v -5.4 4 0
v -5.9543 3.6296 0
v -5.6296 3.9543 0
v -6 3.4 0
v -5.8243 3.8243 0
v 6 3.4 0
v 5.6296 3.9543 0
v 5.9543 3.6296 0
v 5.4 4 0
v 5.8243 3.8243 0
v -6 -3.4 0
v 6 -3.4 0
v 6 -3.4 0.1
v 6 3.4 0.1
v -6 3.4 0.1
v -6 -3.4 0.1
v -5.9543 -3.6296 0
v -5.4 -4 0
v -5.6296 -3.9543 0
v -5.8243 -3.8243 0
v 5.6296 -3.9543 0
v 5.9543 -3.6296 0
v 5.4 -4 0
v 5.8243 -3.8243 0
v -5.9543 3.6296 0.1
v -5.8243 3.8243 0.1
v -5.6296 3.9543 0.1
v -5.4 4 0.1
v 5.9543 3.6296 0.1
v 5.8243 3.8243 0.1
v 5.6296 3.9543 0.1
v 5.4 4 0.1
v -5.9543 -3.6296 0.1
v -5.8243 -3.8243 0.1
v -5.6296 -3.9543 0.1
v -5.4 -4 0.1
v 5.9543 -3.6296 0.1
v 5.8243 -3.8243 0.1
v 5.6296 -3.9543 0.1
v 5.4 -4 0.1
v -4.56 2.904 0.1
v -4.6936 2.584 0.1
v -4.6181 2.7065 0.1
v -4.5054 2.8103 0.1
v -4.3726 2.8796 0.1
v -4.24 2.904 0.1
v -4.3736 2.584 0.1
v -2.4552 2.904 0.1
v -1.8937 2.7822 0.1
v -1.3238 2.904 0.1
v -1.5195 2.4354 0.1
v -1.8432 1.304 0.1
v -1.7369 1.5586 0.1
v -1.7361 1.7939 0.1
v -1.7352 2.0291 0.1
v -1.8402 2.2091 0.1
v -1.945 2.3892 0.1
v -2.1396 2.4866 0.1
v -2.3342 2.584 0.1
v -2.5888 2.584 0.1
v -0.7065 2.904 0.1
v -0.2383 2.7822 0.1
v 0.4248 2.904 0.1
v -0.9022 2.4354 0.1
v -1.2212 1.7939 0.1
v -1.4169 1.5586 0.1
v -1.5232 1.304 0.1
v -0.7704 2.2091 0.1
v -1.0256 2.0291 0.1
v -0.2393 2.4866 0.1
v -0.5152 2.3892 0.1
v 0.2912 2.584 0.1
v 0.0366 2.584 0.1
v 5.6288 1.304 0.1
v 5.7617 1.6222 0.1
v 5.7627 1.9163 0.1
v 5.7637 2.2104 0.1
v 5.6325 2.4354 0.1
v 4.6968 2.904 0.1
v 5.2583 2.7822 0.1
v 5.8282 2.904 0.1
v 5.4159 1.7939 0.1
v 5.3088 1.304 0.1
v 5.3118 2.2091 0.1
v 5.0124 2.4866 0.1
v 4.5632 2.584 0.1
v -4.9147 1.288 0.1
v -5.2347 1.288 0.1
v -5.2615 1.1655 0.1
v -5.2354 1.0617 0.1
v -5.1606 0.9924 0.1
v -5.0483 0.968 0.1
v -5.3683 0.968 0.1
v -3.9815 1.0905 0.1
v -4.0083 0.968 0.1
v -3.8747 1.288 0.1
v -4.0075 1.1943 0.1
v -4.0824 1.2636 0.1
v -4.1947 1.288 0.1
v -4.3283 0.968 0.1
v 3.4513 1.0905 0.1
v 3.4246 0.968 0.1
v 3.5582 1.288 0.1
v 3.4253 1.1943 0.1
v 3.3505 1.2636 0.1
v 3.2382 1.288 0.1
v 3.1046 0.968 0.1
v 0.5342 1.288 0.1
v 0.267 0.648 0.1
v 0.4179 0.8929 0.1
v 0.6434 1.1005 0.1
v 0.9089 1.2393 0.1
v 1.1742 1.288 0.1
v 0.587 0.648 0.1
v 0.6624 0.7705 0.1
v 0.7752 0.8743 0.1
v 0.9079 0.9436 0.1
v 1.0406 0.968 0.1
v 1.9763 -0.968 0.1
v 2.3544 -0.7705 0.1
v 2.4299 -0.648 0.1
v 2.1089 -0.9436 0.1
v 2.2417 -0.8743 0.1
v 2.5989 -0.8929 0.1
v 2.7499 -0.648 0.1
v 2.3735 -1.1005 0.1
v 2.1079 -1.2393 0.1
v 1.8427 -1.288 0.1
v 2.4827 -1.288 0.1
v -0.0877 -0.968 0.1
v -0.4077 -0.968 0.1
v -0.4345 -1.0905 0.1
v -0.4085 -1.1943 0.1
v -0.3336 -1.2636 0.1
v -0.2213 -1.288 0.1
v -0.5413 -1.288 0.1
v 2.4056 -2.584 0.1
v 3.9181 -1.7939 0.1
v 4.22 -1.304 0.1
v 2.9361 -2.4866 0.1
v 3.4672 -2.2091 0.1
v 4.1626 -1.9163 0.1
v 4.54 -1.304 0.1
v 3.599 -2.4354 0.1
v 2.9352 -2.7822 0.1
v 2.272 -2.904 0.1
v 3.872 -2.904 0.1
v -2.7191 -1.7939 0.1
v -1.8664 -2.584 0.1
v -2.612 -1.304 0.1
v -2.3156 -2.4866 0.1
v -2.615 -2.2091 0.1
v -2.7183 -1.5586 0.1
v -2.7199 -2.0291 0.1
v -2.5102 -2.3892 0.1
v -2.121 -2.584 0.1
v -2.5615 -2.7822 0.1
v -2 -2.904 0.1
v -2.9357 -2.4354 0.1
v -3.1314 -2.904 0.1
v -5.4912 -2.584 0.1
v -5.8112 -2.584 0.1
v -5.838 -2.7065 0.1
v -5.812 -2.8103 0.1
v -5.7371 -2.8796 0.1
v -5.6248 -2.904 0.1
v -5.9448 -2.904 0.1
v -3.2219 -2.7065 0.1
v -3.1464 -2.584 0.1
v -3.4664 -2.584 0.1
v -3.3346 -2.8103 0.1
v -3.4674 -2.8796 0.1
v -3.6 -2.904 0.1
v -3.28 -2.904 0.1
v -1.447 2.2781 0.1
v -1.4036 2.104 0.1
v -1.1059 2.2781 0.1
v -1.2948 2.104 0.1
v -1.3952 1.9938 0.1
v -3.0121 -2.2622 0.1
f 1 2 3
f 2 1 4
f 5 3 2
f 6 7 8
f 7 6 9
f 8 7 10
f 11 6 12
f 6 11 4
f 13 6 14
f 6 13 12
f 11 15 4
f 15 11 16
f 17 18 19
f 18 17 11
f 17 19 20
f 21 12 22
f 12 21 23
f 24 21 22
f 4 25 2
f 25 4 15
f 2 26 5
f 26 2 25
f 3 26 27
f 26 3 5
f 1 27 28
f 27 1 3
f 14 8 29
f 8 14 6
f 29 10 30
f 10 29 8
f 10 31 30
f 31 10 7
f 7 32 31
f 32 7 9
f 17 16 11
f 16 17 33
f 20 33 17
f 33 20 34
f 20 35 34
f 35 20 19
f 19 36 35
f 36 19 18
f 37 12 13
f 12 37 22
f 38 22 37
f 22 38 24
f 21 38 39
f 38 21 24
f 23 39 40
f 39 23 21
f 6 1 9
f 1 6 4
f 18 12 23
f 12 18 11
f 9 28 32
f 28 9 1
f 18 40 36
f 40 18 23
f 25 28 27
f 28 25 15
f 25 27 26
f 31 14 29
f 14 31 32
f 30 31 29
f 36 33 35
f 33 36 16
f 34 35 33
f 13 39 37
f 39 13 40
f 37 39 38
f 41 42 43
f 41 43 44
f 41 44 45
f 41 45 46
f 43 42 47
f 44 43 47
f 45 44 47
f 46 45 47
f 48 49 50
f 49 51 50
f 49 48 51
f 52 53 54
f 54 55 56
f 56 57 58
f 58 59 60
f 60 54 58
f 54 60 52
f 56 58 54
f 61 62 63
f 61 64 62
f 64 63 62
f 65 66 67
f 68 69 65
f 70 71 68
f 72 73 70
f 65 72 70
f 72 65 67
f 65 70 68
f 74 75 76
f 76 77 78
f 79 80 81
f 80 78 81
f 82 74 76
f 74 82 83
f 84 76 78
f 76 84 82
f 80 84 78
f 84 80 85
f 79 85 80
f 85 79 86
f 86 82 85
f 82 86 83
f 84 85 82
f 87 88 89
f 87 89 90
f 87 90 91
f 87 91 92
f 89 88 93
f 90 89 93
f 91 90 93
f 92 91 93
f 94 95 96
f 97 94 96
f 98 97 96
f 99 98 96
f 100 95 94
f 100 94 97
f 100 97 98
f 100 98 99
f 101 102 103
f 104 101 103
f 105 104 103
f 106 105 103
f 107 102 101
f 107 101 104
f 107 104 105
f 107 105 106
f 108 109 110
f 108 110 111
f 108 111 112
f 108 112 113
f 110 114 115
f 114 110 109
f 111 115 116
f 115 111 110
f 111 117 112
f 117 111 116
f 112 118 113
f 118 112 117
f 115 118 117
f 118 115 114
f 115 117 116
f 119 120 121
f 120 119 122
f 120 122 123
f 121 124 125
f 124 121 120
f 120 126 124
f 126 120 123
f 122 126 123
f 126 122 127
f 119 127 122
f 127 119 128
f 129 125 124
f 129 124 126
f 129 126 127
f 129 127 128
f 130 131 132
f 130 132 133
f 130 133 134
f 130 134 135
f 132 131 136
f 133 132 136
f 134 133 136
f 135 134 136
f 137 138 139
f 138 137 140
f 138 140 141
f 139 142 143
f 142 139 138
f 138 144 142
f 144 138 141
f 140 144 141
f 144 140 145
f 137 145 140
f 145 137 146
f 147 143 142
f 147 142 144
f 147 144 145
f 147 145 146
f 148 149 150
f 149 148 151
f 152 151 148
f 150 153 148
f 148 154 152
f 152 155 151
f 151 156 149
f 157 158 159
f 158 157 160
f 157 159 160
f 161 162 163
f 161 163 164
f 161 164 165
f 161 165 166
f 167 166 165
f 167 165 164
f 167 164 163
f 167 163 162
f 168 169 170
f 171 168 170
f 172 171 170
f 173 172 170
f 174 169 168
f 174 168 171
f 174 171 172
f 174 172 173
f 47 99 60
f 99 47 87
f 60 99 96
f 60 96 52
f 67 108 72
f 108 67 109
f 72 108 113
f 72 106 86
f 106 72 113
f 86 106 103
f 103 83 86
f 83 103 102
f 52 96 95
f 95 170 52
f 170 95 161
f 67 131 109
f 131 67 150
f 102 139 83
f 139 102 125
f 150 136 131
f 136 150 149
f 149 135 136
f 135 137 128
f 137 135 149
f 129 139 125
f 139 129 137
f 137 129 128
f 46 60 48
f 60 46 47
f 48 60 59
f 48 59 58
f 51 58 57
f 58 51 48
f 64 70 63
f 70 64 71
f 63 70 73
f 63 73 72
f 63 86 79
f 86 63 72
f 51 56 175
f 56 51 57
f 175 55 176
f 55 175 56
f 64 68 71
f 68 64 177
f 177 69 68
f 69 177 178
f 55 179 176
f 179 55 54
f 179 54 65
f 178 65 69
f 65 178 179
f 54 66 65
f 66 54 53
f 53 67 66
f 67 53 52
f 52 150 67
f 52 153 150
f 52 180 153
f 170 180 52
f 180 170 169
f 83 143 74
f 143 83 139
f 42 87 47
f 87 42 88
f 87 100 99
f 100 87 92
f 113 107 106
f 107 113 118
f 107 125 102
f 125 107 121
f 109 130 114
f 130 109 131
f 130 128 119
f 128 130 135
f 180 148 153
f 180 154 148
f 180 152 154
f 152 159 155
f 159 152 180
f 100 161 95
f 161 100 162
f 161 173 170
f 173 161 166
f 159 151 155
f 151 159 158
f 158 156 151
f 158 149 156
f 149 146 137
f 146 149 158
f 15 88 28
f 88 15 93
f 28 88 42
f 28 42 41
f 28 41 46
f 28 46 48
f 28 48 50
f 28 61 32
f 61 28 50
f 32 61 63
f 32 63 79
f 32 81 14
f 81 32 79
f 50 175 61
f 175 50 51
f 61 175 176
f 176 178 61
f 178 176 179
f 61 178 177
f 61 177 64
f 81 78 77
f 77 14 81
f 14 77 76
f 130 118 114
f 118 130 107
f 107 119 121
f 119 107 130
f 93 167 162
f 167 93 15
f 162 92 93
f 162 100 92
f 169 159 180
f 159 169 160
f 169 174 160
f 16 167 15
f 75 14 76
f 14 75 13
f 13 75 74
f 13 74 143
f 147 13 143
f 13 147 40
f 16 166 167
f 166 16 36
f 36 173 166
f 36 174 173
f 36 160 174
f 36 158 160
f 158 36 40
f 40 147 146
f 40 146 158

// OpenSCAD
// file: ../p/box3u12.scad
use <../lib.scad>
function ldraw_lib__box3u12() = [
// 0 Box with 3 Parallel Faces without Any Edges
// 0 Name: box3u12.dat
// 0 Author: J.C. Tchang [tchang]
// 0 !LDRAW_ORG Primitive UPDATE 2014-02
// 0 !LICENSE Licensed under CC BY 4.0 : see CAreadme.txt
// 
// 0 BFC CERTIFY CCW
  [0,"BFC","CERTIFY"],
  [0,"BFC","CCW"],
// 
// 0 !HISTORY 2014-12-23 [PTadmin] Official Update 2014-02
// 
// 
// 4 16 -1 1 1 1 1 1 1 1 -1 -1 1 -1
  [4,16,-1,1,1,1,1,1,1,1,-1,-1,1,-1],
// 4 16 -1 1 1 -1 0 1 1 0 1 1 1 1
  [4,16,-1,1,1,-1,0,1,1,0,1,1,1,1],
// 4 16 1 1 -1 1 0 -1 -1 0 -1 -1 1 -1
  [4,16,1,1,-1,1,0,-1,-1,0,-1,-1,1,-1],
];
module ldraw_lib__box3u12(step=0, col=false, unit=2/5, alt=false, line=0.2, solid=!$preview)
    makepoly(ldraw_lib__box3u12(), step=step, col=col, unit=unit, alt=alt, line=line, solid=solid);
ldraw_lib__box3u12(line=0.2);
// file: ../p/1-4cyli.scad
use <../lib.scad>
function ldraw_lib__1_4cyli() = [
// 0 Cylinder 0.25
// 0 Name: 1-4cyli.dat
// 0 Author: James Jessiman
// 0 !LDRAW_ORG Primitive UPDATE 2012-01
// 0 !LICENSE Licensed under CC BY 4.0 : see CAreadme.txt
// 
// 0 BFC CERTIFY CCW
  [0,"BFC","CERTIFY"],
  [0,"BFC","CCW"],
// 
// 0 !HISTORY 2002-03-23 [sbliss] Added BFC statement.
// 0 !HISTORY 2002-04-25 [PTadmin] Official Update 2002-02
// 0 !HISTORY 2007-06-22 [PTadmin] Header formatted for Contributor Agreement
// 0 !HISTORY 2008-07-01 [PTadmin] Official Update 2008-01
// 0 !HISTORY 2012-02-16 [Philo] Changed to CCW
// 0 !HISTORY 2012-03-30 [PTadmin] Official Update 2012-01
// 
// 
// 4 16 1 1 0 0.9239 1 0.3827 0.9239 0 0.3827 1 0 0
  [4,16,1,1,0,0.9239,1,0.3827,0.9239,0,0.3827,1,0,0],
// 5 24 1 0 0 1 1 0 0.9239 0 0.3827 1 0 -1
  [5,24,1,0,0,1,1,0,0.9239,0,0.3827,1,0,-1],
// 4 16 0.9239 1 0.3827 0.7071 1 0.7071 0.7071 0 0.7071 0.9239 0 0.3827
  [4,16,0.9239,1,0.3827,0.7071,1,0.7071,0.7071,0,0.7071,0.9239,0,0.3827],
// 5 24 0.9239 0 0.3827 0.9239 1 0.3827 0.7071 0 0.7071 1 0 0
  [5,24,0.9239,0,0.3827,0.9239,1,0.3827,0.7071,0,0.7071,1,0,0],
// 4 16 0.7071 1 0.7071 0.3827 1 0.9239 0.3827 0 0.9239 0.7071 0 0.7071
  [4,16,0.7071,1,0.7071,0.3827,1,0.9239,0.3827,0,0.9239,0.7071,0,0.7071],
// 5 24 0.7071 0 0.7071 0.7071 1 0.7071 0.3827 0 0.9239 0.9239 0 0.3827
  [5,24,0.7071,0,0.7071,0.7071,1,0.7071,0.3827,0,0.9239,0.9239,0,0.3827],
// 4 16 0.3827 1 0.9239 0 1 1 0 0 1 0.3827 0 0.9239
  [4,16,0.3827,1,0.9239,0,1,1,0,0,1,0.3827,0,0.9239],
// 5 24 0.3827 0 0.9239 0.3827 1 0.9239 0 0 1 0.7071 0 0.7071
  [5,24,0.3827,0,0.9239,0.3827,1,0.9239,0,0,1,0.7071,0,0.7071],
// 5 24 0 0 1 0 1 1 0.3827 0 0.9239 -1 0 1
  [5,24,0,0,1,0,1,1,0.3827,0,0.9239,-1,0,1],
];
module ldraw_lib__1_4cyli(step=0, col=false, unit=2/5, alt=false, line=0.2, solid=!$preview)
    makepoly(ldraw_lib__1_4cyli(), step=step, col=col, unit=unit, alt=alt, line=line, solid=solid);
ldraw_lib__1_4cyli(line=0.2);
// file: s/stickerback010x015.scad
use <../../lib.scad>
use <../../p/1-4chrd.scad>
use <../../p/1-4cyli.scad>
use <../../p/box3u12.scad>
function ldraw_lib__s__stickerback010x015() = [
// 0 ~Sticker Back  1.0 x  1.5
// 0 Name: s\stickerback010x015.dat
// 0 Author: Massimo Maso [Sirio]
// 0 !LDRAW_ORG Subpart UPDATE 2025-09
// 0 !LICENSE Licensed under CC BY 4.0 : see CAreadme.txt
// 
// 0 BFC CERTIFY CCW
  [0,"BFC","CERTIFY"],
  [0,"BFC","CCW"],
// 
// 0 !HISTORY 2025-09-29 [OrionP] Official Update 2025-09
// 
// 0 // Primitives
// 1 16 -13.5 0 8.5 -1.5 0 0 0 -1 0 0 0 1.5 1-4chrd.dat
  [1,16,-13.5,0,8.5,-1.5,0,0,0,-1,0,0,0,1.5, ldraw_lib__1_4chrd()],
// 1 16 13.5 0 8.5 1.5 0 0 0 -1 0 0 0 1.5 1-4chrd.dat
  [1,16,13.5,0,8.5,1.5,0,0,0,-1,0,0,0,1.5, ldraw_lib__1_4chrd()],
// 1 16 0 -.25 0 0 0 15 0 .25 0 8.5 0 0 box3u12.dat
  [1,16,0,-.25,0,0,0,15,0,.25,0,8.5,0,0, ldraw_lib__box3u12()],
// 1 16 -13.5 0 -8.5 -1.5 0 0 0 -1 0 0 0 -1.5 1-4chrd.dat
  [1,16,-13.5,0,-8.5,-1.5,0,0,0,-1,0,0,0,-1.5, ldraw_lib__1_4chrd()],
// 1 16 13.5 0 -8.5 1.5 0 0 0 -1 0 0 0 -1.5 1-4chrd.dat
  [1,16,13.5,0,-8.5,1.5,0,0,0,-1,0,0,0,-1.5, ldraw_lib__1_4chrd()],
// 1 16 -13.5 0 8.5 -1.5 0 0 0 -.25 0 0 0 1.5 1-4cyli.dat
  [1,16,-13.5,0,8.5,-1.5,0,0,0,-.25,0,0,0,1.5, ldraw_lib__1_4cyli()],
// 1 16 13.5 0 8.5 1.5 0 0 0 -.25 0 0 0 1.5 1-4cyli.dat
  [1,16,13.5,0,8.5,1.5,0,0,0,-.25,0,0,0,1.5, ldraw_lib__1_4cyli()],
// 1 16 -13.5 0 -8.5 -1.5 0 0 0 -.25 0 0 0 -1.5 1-4cyli.dat
  [1,16,-13.5,0,-8.5,-1.5,0,0,0,-.25,0,0,0,-1.5, ldraw_lib__1_4cyli()],
// 1 16 13.5 0 -8.5 1.5 0 0 0 -.25 0 0 0 -1.5 1-4cyli.dat
  [1,16,13.5,0,-8.5,1.5,0,0,0,-.25,0,0,0,-1.5, ldraw_lib__1_4cyli()],
// 0 // Bottom faces
// 4 16 -15 0 8.5 -13.5 0 10 13.5 0 10 15 0 8.5
  [4,16,-15,0,8.5,-13.5,0,10,13.5,0,10,15,0,8.5],
// 4 16 -15 0 -8.5 15 0 -8.5 13.5 0 -10 -13.5 0 -10
  [4,16,-15,0,-8.5,15,0,-8.5,13.5,0,-10,-13.5,0,-10],
// 0 // Lateral faces
// 4 16 -13.5 0 10 -13.5 -.25 10 13.5 -.25 10 13.5 0 10
  [4,16,-13.5,0,10,-13.5,-.25,10,13.5,-.25,10,13.5,0,10],
// 4 16 -13.5 0 -10 13.5 0 -10 13.5 -.25 -10 -13.5 -.25 -10
  [4,16,-13.5,0,-10,13.5,0,-10,13.5,-.25,-10,-13.5,-.25,-10],
];
module ldraw_lib__s__stickerback010x015(step=0, col=false, unit=2/5, alt=false, line=0.2, solid=!$preview)
    makepoly(ldraw_lib__s__stickerback010x015(), step=step, col=col, unit=unit, alt=alt, line=line, solid=solid);
ldraw_lib__s__stickerback010x015(line=0.2);
// file: ../p/1-8tndis.scad
use <../lib.scad>
function ldraw_lib__1_8tndis() = [
// 0 Disc Negative Truncated 0.125
// 0 Name: 1-8tndis.dat
// 0 Author: Massimo Maso [Sirio]
// 0 !LDRAW_ORG Primitive UPDATE 2022-02
// 0 !LICENSE Licensed under CC BY 4.0 : see CAreadme.txt
// 
// 0 BFC CERTIFY CCW
  [0,"BFC","CERTIFY"],
  [0,"BFC","CCW"],
// 
// 0 !HISTORY 2022-03-06 [PTadmin] Official Update 2022-02
// 
// 
// 3 16 1 0 .7071 .9239 0 .3827 1 0 0
  [3,16,1,0,.7071,.9239,0,.3827,1,0,0],
// 3 16 1 0 .7071 .7071 0 .7071 .9239 0 .3827
  [3,16,1,0,.7071,.7071,0,.7071,.9239,0,.3827],
];
module ldraw_lib__1_8tndis(step=0, col=false, unit=2/5, alt=false, line=0.2, solid=!$preview)
    makepoly(ldraw_lib__1_8tndis(), step=step, col=col, unit=unit, alt=alt, line=line, solid=solid);
ldraw_lib__1_8tndis(line=0.2);
// file: ../p/1-8tang.scad
use <../lib.scad>
function ldraw_lib__1_8tang() = [
// 0 Disc Negative Tangent 0.125
// 0 Name: 1-8tang.dat
// 0 Author: Steffen [Steffen]
// 0 !LDRAW_ORG Primitive UPDATE 2011-02
// 0 !LICENSE Licensed under CC BY 4.0 : see CAreadme.txt
// 
// 0 BFC CERTIFY CCW
  [0,"BFC","CERTIFY"],
  [0,"BFC","CCW"],
// 
// 0 !HISTORY 2005-08-03 [OrionP] Updated to conform to 1-4tang.dat
// 0 !HISTORY 2011-12-29 [PTadmin] Official Update 2011-02
// 
// 
// 3 16 1 0 0 1 0 0.1989 0.9239 0 0.3827
  [3,16,1,0,0,1,0,0.1989,0.9239,0,0.3827],
// 3 16 0.9239 0 0.3827 0.8478 0 0.5665 0.7071 0 0.7071
  [3,16,0.9239,0,0.3827,0.8478,0,0.5665,0.7071,0,0.7071],
];
module ldraw_lib__1_8tang(step=0, col=false, unit=2/5, alt=false, line=0.2, solid=!$preview)
    makepoly(ldraw_lib__1_8tang(), step=step, col=col, unit=unit, alt=alt, line=line, solid=solid);
ldraw_lib__1_8tang(line=0.2);
// file: ../p/1-8chrd.scad
use <../lib.scad>
function ldraw_lib__1_8chrd() = [
// 0 Chord 0.125
// 0 Name: 1-8chrd.dat
// 0 Author: Orion Pobursky [OrionP]
// 0 !LDRAW_ORG Primitive UPDATE 2023-05
// 0 !LICENSE Licensed under CC BY 4.0 : see CAreadme.txt
// 
// 0 BFC CERTIFY CCW
  [0,"BFC","CERTIFY"],
  [0,"BFC","CCW"],
// 
// 0 !HISTORY 2004-04-22 [PTadmin] Official Update 2004-02
// 0 !HISTORY 2007-06-22 [PTadmin] Header formatted for Contributor Agreement
// 0 !HISTORY 2008-07-01 [PTadmin] Official Update 2008-01
// 0 !HISTORY 2023-10-27 [OrionP] Rebuilt with PrimGen2, original author westrate
// 0 !HISTORY 2023-10-31 [OrionP] Official Update 2023-05
// 
// 3 16 1 0 0 0.9239 0 0.3827 0.7071 0 0.7071
  [3,16,1,0,0,0.9239,0,0.3827,0.7071,0,0.7071],
];
module ldraw_lib__1_8chrd(step=0, col=false, unit=2/5, alt=false, line=0.2, solid=!$preview)
    makepoly(ldraw_lib__1_8chrd(), step=step, col=col, unit=unit, alt=alt, line=line, solid=solid);
ldraw_lib__1_8chrd(line=0.2);
// file: ../p/1-4tang.scad
use <../lib.scad>
function ldraw_lib__1_4tang() = [
// 0 Disc Negative Tangent 0.25
// 0 Name: 1-4tang.dat
// 0 Author: Willy Tschager [Holly-Wood]
// 0 !LDRAW_ORG Primitive UPDATE 2024-01
// 0 !LICENSE Licensed under CC BY 4.0 : see CAreadme.txt
// 
// 0 BFC CERTIFY CCW
  [0,"BFC","CERTIFY"],
  [0,"BFC","CCW"],
// 
// 0 !HISTORY 2011-12-29 [PTadmin] Official Update 2011-02
// 0 !HISTORY 2024-01-08 [Holly-Wood] Complete re-write, original by westrate
// 0 !HISTORY 2024-01-29 [OrionP] Official Update 2024-01
// 
// 3 16 0 0 1 0.3827 0 0.9239 0.1989 0 1
  [3,16,0,0,1,0.3827,0,0.9239,0.1989,0,1],
// 3 16 0.3827 0 0.9239 0.7071 0 0.7071 0.5665 0 0.8478
  [3,16,0.3827,0,0.9239,0.7071,0,0.7071,0.5665,0,0.8478],
// 3 16 0.7071 0 0.7071 0.9239 0 0.3827 0.8478 0 0.5665
  [3,16,0.7071,0,0.7071,0.9239,0,0.3827,0.8478,0,0.5665],
// 3 16 0.9239 0 0.3827 1 0 0 1 0 0.1989
  [3,16,0.9239,0,0.3827,1,0,0,1,0,0.1989],
];
module ldraw_lib__1_4tang(step=0, col=false, unit=2/5, alt=false, line=0.2, solid=!$preview)
    makepoly(ldraw_lib__1_4tang(), step=step, col=col, unit=unit, alt=alt, line=line, solid=solid);
ldraw_lib__1_4tang(line=0.2);
// file: ../p/1-4ring4.scad
use <../lib.scad>
function ldraw_lib__1_4ring4() = [
// 0 Ring  4 x 0.25
// 0 Name: 1-4ring4.dat
// 0 Author: Willy Tschager [Holly-Wood]
// 0 !LDRAW_ORG Primitive UPDATE 2024-01
// 0 !LICENSE Licensed under CC BY 4.0 : see CAreadme.txt
// 
// 0 BFC CERTIFY CCW
  [0,"BFC","CERTIFY"],
  [0,"BFC","CCW"],
// 
// 0 !HISTORY 2000-09-30 [PTadmin] Official Update 2000-02
// 0 !HISTORY 2003-08-01 [PTadmin] Official Update 2003-02
// 0 !HISTORY 2007-06-22 [PTadmin] Header formatted for Contributor Agreement
// 0 !HISTORY 2008-07-01 [PTadmin] Official Update 2008-01
// 0 !HISTORY 2012-02-16 [Philo] Changed to CCW
// 0 !HISTORY 2012-03-30 [PTadmin] Official Update 2012-01
// 0 !HISTORY 2024-01-06 [Holly-Wood] Complete regeneration, original by bbroich
// 0 !HISTORY 2024-01-29 [OrionP] Official Update 2024-01
// 
// 4 16 5 0 0 4.6195 0 1.9135 3.6956 0 1.5308 4 0 0
  [4,16,5,0,0,4.6195,0,1.9135,3.6956,0,1.5308,4,0,0],
// 4 16 4.6195 0 1.9135 3.5355 0 3.5355 2.8284 0 2.8284 3.6956 0 1.5308
  [4,16,4.6195,0,1.9135,3.5355,0,3.5355,2.8284,0,2.8284,3.6956,0,1.5308],
// 4 16 3.5355 0 3.5355 1.9135 0 4.6195 1.5308 0 3.6956 2.8284 0 2.8284
  [4,16,3.5355,0,3.5355,1.9135,0,4.6195,1.5308,0,3.6956,2.8284,0,2.8284],
// 4 16 1.9135 0 4.6195 0 0 5 0 0 4 1.5308 0 3.6956
  [4,16,1.9135,0,4.6195,0,0,5,0,0,4,1.5308,0,3.6956],
// 0 // Build by LDPartEditor (PrimGen 2.X)
];
module ldraw_lib__1_4ring4(step=0, col=false, unit=2/5, alt=false, line=0.2, solid=!$preview)
    makepoly(ldraw_lib__1_4ring4(), step=step, col=col, unit=unit, alt=alt, line=line, solid=solid);
ldraw_lib__1_4ring4(line=0.2);
// file: ../p/1-4ring1.scad
use <../lib.scad>
function ldraw_lib__1_4ring1() = [
// 0 Ring  1 x 0.25
// 0 Name: 1-4ring1.dat
// 0 Author: Chris Dee [cwdee]
// 0 !LDRAW_ORG Primitive UPDATE 2012-01
// 0 !LICENSE Licensed under CC BY 4.0 : see CAreadme.txt
// 
// 0 BFC CERTIFY CCW
  [0,"BFC","CERTIFY"],
  [0,"BFC","CCW"],
// 
// 0 !HISTORY 2000-05-07 [PTadmin] Official Update 2000-01
// 0 !HISTORY 2002-11-22 [hafhead] Added BFC statement
// 0 !HISTORY 2002-11-30 [PTadmin] Official Update 2002-05
// 0 !HISTORY 2007-06-22 [PTadmin] Header formatted for Contributor Agreement
// 0 !HISTORY 2008-07-01 [PTadmin] Official Update 2008-01
// 0 !HISTORY 2012-02-16 [Philo] Changed to CCW
// 0 !HISTORY 2012-03-30 [PTadmin] Official Update 2012-01
// 
// 
// 4 16 2 0 0 1.8478 0 0.7654 0.9239 0 0.3827 1 0 0
  [4,16,2,0,0,1.8478,0,0.7654,0.9239,0,0.3827,1,0,0],
// 4 16 1.8478 0 0.7654 1.4142 0 1.4142 0.7071 0 0.7071 0.9239 0 0.3827
  [4,16,1.8478,0,0.7654,1.4142,0,1.4142,0.7071,0,0.7071,0.9239,0,0.3827],
// 4 16 1.4142 0 1.4142 0.7654 0 1.8478 0.3827 0 0.9239 0.7071 0 0.7071
  [4,16,1.4142,0,1.4142,0.7654,0,1.8478,0.3827,0,0.9239,0.7071,0,0.7071],
// 4 16 0.7654 0 1.8478 0 0 2 0 0 1 0.3827 0 0.9239
  [4,16,0.7654,0,1.8478,0,0,2,0,0,1,0.3827,0,0.9239],
];
module ldraw_lib__1_4ring1(step=0, col=false, unit=2/5, alt=false, line=0.2, solid=!$preview)
    makepoly(ldraw_lib__1_4ring1(), step=step, col=col, unit=unit, alt=alt, line=line, solid=solid);
ldraw_lib__1_4ring1(line=0.2);
// file: ../p/1-4ndis.scad
use <../lib.scad>
function ldraw_lib__1_4ndis() = [
// 0 Disc Negative 0.25
// 0 Name: 1-4ndis.dat
// 0 Author: James Jessiman
// 0 !LDRAW_ORG Primitive UPDATE 2012-01
// 0 !LICENSE Licensed under CC BY 4.0 : see CAreadme.txt
// 
// 0 BFC CERTIFY CCW
  [0,"BFC","CERTIFY"],
  [0,"BFC","CCW"],
// 
// 0 !HISTORY 2002-03-23 [sbliss] Added BFC Statement
// 0 !HISTORY 2002-04-25 [PTadmin] Official Update 2002-02
// 0 !HISTORY 2007-06-22 [PTadmin] Header formatted for Contributor Agreement
// 0 !HISTORY 2008-07-01 [PTadmin] Official Update 2008-01
// 0 !HISTORY 2012-02-16 [Philo] Changed to CCW
// 0 !HISTORY 2012-03-30 [PTadmin] Official Update 2012-01
// 
// 
// 3 16 0.9239 0 0.3827 1 0 0 1 0 1
  [3,16,0.9239,0,0.3827,1,0,0,1,0,1],
// 3 16 0.7071 0 0.7071 0.9239 0 0.3827 1 0 1
  [3,16,0.7071,0,0.7071,0.9239,0,0.3827,1,0,1],
// 3 16 0.3827 0 0.9239 0.7071 0 0.7071 1 0 1
  [3,16,0.3827,0,0.9239,0.7071,0,0.7071,1,0,1],
// 3 16 0 0 1 0.3827 0 0.9239 1 0 1
  [3,16,0,0,1,0.3827,0,0.9239,1,0,1],
];
module ldraw_lib__1_4ndis(step=0, col=false, unit=2/5, alt=false, line=0.2, solid=!$preview)
    makepoly(ldraw_lib__1_4ndis(), step=step, col=col, unit=unit, alt=alt, line=line, solid=solid);
ldraw_lib__1_4ndis(line=0.2);
// file: ../p/1-4disc.scad
use <../lib.scad>
function ldraw_lib__1_4disc() = [
// 0 Disc 0.25
// 0 Name: 1-4disc.dat
// 0 Author: James Jessiman
// 0 !LDRAW_ORG Primitive UPDATE 2002-02
// 0 !LICENSE Licensed under CC BY 4.0 : see CAreadme.txt
// 
// 0 BFC CERTIFY CCW
  [0,"BFC","CERTIFY"],
  [0,"BFC","CCW"],
// 
// 0 !HISTORY 2002-03-23 [sbliss] Added BFC statement.
// 0 !HISTORY 2002-04-25 [PTadmin] Official Update 2002-02
// 0 !HISTORY 2007-06-22 [PTadmin] Header formatted for Contributor Agreement
// 0 !HISTORY 2008-07-01 [PTadmin] Official Update 2008-01
// 
// 
// 3 16 0 0 0 1 0 0 0.9239 0 0.3827
  [3,16,0,0,0,1,0,0,0.9239,0,0.3827],
// 3 16 0 0 0 0.9239 0 0.3827 0.7071 0 0.7071
  [3,16,0,0,0,0.9239,0,0.3827,0.7071,0,0.7071],
// 3 16 0 0 0 0.7071 0 0.7071 0.3827 0 0.9239
  [3,16,0,0,0,0.7071,0,0.7071,0.3827,0,0.9239],
// 3 16 0 0 0 0.3827 0 0.9239 0 0 1
  [3,16,0,0,0,0.3827,0,0.9239,0,0,1],
// 0
];
module ldraw_lib__1_4disc(step=0, col=false, unit=2/5, alt=false, line=0.2, solid=!$preview)
    makepoly(ldraw_lib__1_4disc(), step=step, col=col, unit=unit, alt=alt, line=line, solid=solid);
ldraw_lib__1_4disc(line=0.2);
// file: ../p/1-4chrd.scad
use <../lib.scad>
function ldraw_lib__1_4chrd() = [
// 0 Chord 0.25
// 0 Name: 1-4chrd.dat
// 0 Author: Max Martin Richter [MMR1988]
// 0 !LDRAW_ORG Primitive UPDATE 2023-05
// 0 !LICENSE Licensed under CC BY 4.0 : see CAreadme.txt
// 
// 0 BFC CERTIFY CCW
  [0,"BFC","CERTIFY"],
  [0,"BFC","CCW"],
// 
// 0 !HISTORY 2004-04-22 [PTadmin] Official Update 2004-02
// 0 !HISTORY 2007-10-09 [PTadmin] Header formatted for Contributor Agreement
// 0 !HISTORY 2008-07-01 [PTadmin] Official Update 2008-01
// 0 !HISTORY 2012-08-02 [MMR1988] Re-creation with PrimGen2 and Rectifier
// 0 !HISTORY 2012-08-09 [PTadmin] Official Update 2012-02
// 0 !HISTORY 2023-10-27 [OrionP] Change author to MMR1988 from hafhead
// 0 !HISTORY 2023-10-31 [OrionP] Official Update 2023-05
// 
// 4 16 0.9239 0 0.3827 0.3827 0 0.9239 0 0 1 1 0 0
  [4,16,0.9239,0,0.3827,0.3827,0,0.9239,0,0,1,1,0,0],
// 3 16 0.7071 0 0.7071 0.3827 0 0.9239 0.9239 0 0.3827
  [3,16,0.7071,0,0.7071,0.3827,0,0.9239,0.9239,0,0.3827],
];
module ldraw_lib__1_4chrd(step=0, col=false, unit=2/5, alt=false, line=0.2, solid=!$preview)
    makepoly(ldraw_lib__1_4chrd(), step=step, col=col, unit=unit, alt=alt, line=line, solid=solid);
ldraw_lib__1_4chrd(line=0.2);
// main file
use <../lib.scad>
use <../p/1-4chrd.scad>
use <../p/1-4disc.scad>
use <../p/1-4ndis.scad>
use <../p/1-4ring1.scad>
use <../p/1-4ring4.scad>
use <../p/1-4tang.scad>
use <../p/1-8chrd.scad>
use <../p/1-8tang.scad>
use <../p/1-8tndis.scad>
use <s/stickerback010x015.scad>
function ldraw_lib__6177970t() = [
// 0 Sticker  1.0 x  1.5 with Black Number 10 on Red Background
// 0 Name: 6177970t.dat
// 0 Author: Massimo Maso [Sirio]
// 0 !LDRAW_ORG Part UPDATE 2025-09
// 0 !LICENSE Licensed under CC BY 4.0 : see CAreadme.txt
// 
// 0 BFC CERTIFY CCW
  [0,"BFC","CERTIFY"],
  [0,"BFC","CCW"],
// 
// 0 !KEYWORDS BrickLink 75882stk01, Center, Development, Ferrari, FXXK
// 0 !KEYWORDS Rebrickable 30899, Set 75882, Speed Champions, Tunnel, Wind
// 
// 0 !HISTORY 2025-09-29 [OrionP] Official Update 2025-09
// 
// 0 // Stickerback
// 1 16 0 0 0 1 0 0 0 1 0 0 0 1 s\stickerback010x015.dat
  [1,16,0,0,0,1,0,0,0,1,0,0,0,1, ldraw_lib__s__stickerback010x015()],
// 0 // Primitives
// 1 4 -13.5 -.25 8.5 -1.5 0 0 0 1 0 0 0 1.5 1-4chrd.dat
  [1,4,-13.5,-.25,8.5,-1.5,0,0,0,1,0,0,0,1.5, ldraw_lib__1_4chrd()],
// 1 4 13.5 -.25 8.5 1.5 0 0 0 1 0 0 0 1.5 1-4chrd.dat
  [1,4,13.5,-.25,8.5,1.5,0,0,0,1,0,0,0,1.5, ldraw_lib__1_4chrd()],
// 1 4 -13.5 -.25 -8.5 -1.5 0 0 0 1 0 0 0 -1.5 1-4chrd.dat
  [1,4,-13.5,-.25,-8.5,-1.5,0,0,0,1,0,0,0,-1.5, ldraw_lib__1_4chrd()],
// 1 4 13.5 -.25 -8.5 1.5 0 0 0 1 0 0 0 -1.5 1-4chrd.dat
  [1,4,13.5,-.25,-8.5,1.5,0,0,0,1,0,0,0,-1.5, ldraw_lib__1_4chrd()],
// 1 4 -10.934 -.25 6.46 -.8 0 .334 0 1 0 0 0 .8 1-4ndis.dat
  [1,4,-10.934,-.25,6.46,-.8,0,.334,0,1,0,0,0,.8, ldraw_lib__1_4ndis()],
// 1 71 -10.934 -.25 6.46 -.8 0 .334 0 1 0 0 0 .8 1-4disc.dat
  [1,71,-10.934,-.25,6.46,-.8,0,.334,0,1,0,0,0,.8, ldraw_lib__1_4disc()],
// 1 4 -7.8079 -.25 3.26 1.67 0 4 0 1 0 4 0 0 1-8tndis.dat
  [1,4,-7.8079,-.25,3.26,1.67,0,4,0,1,0,4,0,0, ldraw_lib__1_8tndis()],
// 1 71 -7.8079 -.25 3.26 1.67 0 4 0 1 0 4 0 0 1-8chrd.dat
  [1,71,-7.8079,-.25,3.26,1.67,0,4,0,1,0,4,0,0, ldraw_lib__1_8chrd()],
// 1 71 -7.8079 -.25 3.26 3.2 0 1.336 0 1 0 0 0 3.2 1-4tang.dat
  [1,71,-7.8079,-.25,3.26,3.2,0,1.336,0,1,0,0,0,3.2, ldraw_lib__1_4tang()],
// 1 0 -7.8079 -.25 3.26 3.2 0 1.336 0 1 0 0 0 3.2 1-4chrd.dat
  [1,0,-7.8079,-.25,3.26,3.2,0,1.336,0,1,0,0,0,3.2, ldraw_lib__1_4chrd()],
// 1 4 -.6079 -.25 3.26 1.67 0 -4 0 1 0 4 0 0 1-8tndis.dat
  [1,4,-.6079,-.25,3.26,1.67,0,-4,0,1,0,4,0,0, ldraw_lib__1_8tndis()],
// 1 71 -.6079 -.25 3.26 1.67 0 -4 0 1 0 4 0 0 1-8chrd.dat
  [1,71,-.6079,-.25,3.26,1.67,0,-4,0,1,0,4,0,0, ldraw_lib__1_8chrd()],
// 1 71 -.6079 -.25 3.26 -3.2 0 1.336 0 1 0 0 0 3.2 1-4tang.dat
  [1,71,-.6079,-.25,3.26,-3.2,0,1.336,0,1,0,0,0,3.2, ldraw_lib__1_4tang()],
// 1 0 -.6079 -.25 3.26 -3.2 0 1.336 0 1 0 0 0 3.2 1-4chrd.dat
  [1,0,-.6079,-.25,3.26,-3.2,0,1.336,0,1,0,0,0,3.2, ldraw_lib__1_4chrd()],
// 1 4 10.0721 -.25 3.26 4 0 1.67 0 1 0 0 0 4 1-8tang.dat
  [1,4,10.0721,-.25,3.26,4,0,1.67,0,1,0,0,0,4, ldraw_lib__1_8tang()],
// 1 4 10.0721 -.25 3.26 1.67 0 4 0 1 0 4 0 0 1-8tndis.dat
  [1,4,10.0721,-.25,3.26,1.67,0,4,0,1,0,4,0,0, ldraw_lib__1_8tndis()],
// 1 71 10.0721 -.25 3.26 .8 0 .334 0 1 0 0 0 .8 1-4ring4.dat
  [1,71,10.0721,-.25,3.26,.8,0,.334,0,1,0,0,0,.8, ldraw_lib__1_4ring4()],
// 1 0 10.0721 -.25 3.26 3.2 0 1.336 0 1 0 0 0 3.2 1-4chrd.dat
  [1,0,10.0721,-.25,3.26,3.2,0,1.336,0,1,0,0,0,3.2, ldraw_lib__1_4chrd()],
// 1 71 -12.2867 -.25 3.22 -.8 0 -.334 0 1 0 0 0 -.8 1-4disc.dat
  [1,71,-12.2867,-.25,3.22,-.8,0,-.334,0,1,0,0,0,-.8, ldraw_lib__1_4disc()],
// 1 4 -12.2867 -.25 3.22 -.8 0 -.334 0 1 0 0 0 -.8 1-4ndis.dat
  [1,4,-12.2867,-.25,3.22,-.8,0,-.334,0,1,0,0,0,-.8, ldraw_lib__1_4ndis()],
// 1 0 -10.8207 -.25 2.42 .8 0 .334 0 1 0 0 0 .8 1-4ndis.dat
  [1,0,-10.8207,-.25,2.42,.8,0,.334,0,1,0,0,0,.8, ldraw_lib__1_4ndis()],
// 1 71 -10.8207 -.25 2.42 .8 0 .334 0 1 0 0 0 .8 1-4disc.dat
  [1,71,-10.8207,-.25,2.42,.8,0,.334,0,1,0,0,0,.8, ldraw_lib__1_4disc()],
// 1 0 7.7614 -.25 2.42 .8 0 .334 0 1 0 0 0 .8 1-4ndis.dat
  [1,0,7.7614,-.25,2.42,.8,0,.334,0,1,0,0,0,.8, ldraw_lib__1_4ndis()],
// 1 71 7.7614 -.25 2.42 .8 0 .334 0 1 0 0 0 .8 1-4disc.dat
  [1,71,7.7614,-.25,2.42,.8,0,.334,0,1,0,0,0,.8, ldraw_lib__1_4disc()],
// 1 0 2.2674 -.25 1.62 -1.6 0 .668 0 1 0 0 0 1.6 1-4ndis.dat
  [1,0,2.2674,-.25,1.62,-1.6,0,.668,0,1,0,0,0,1.6, ldraw_lib__1_4ndis()],
// 1 71 2.2674 -.25 1.62 -.8 0 .334 0 1 0 0 0 .8 1-4ring1.dat
  [1,71,2.2674,-.25,1.62,-.8,0,.334,0,1,0,0,0,.8, ldraw_lib__1_4ring1()],
// 1 4 2.2674 -.25 1.62 -.8 0 .334 0 1 0 0 0 .8 1-4chrd.dat
  [1,4,2.2674,-.25,1.62,-.8,0,.334,0,1,0,0,0,.8, ldraw_lib__1_4chrd()],
// 1 4 5.2747 -.25 -1.62 .8 0 -.334 0 1 0 0 0 -.8 1-4chrd.dat
  [1,4,5.2747,-.25,-1.62,.8,0,-.334,0,1,0,0,0,-.8, ldraw_lib__1_4chrd()],
// 1 71 5.2747 -.25 -1.62 .8 0 -.334 0 1 0 0 0 -.8 1-4ring1.dat
  [1,71,5.2747,-.25,-1.62,.8,0,-.334,0,1,0,0,0,-.8, ldraw_lib__1_4ring1()],
// 1 0 5.2747 -.25 -1.62 1.6 0 -.668 0 1 0 0 0 -1.6 1-4ndis.dat
  [1,0,5.2747,-.25,-1.62,1.6,0,-.668,0,1,0,0,0,-1.6, ldraw_lib__1_4ndis()],
// 1 71 -.2193 -.25 -2.42 -.8 0 -.334 0 1 0 0 0 -.8 1-4disc.dat
  [1,71,-.2193,-.25,-2.42,-.8,0,-.334,0,1,0,0,0,-.8, ldraw_lib__1_4disc()],
// 1 0 -.2193 -.25 -2.42 -.8 0 -.334 0 1 0 0 0 -.8 1-4ndis.dat
  [1,0,-.2193,-.25,-2.42,-.8,0,-.334,0,1,0,0,0,-.8, ldraw_lib__1_4ndis()],
// 1 0 7.35 -.25 -3.26 3.2 0 -1.336 0 1 0 0 0 -3.2 1-4chrd.dat
  [1,0,7.35,-.25,-3.26,3.2,0,-1.336,0,1,0,0,0,-3.2, ldraw_lib__1_4chrd()],
// 1 71 7.35 -.25 -3.26 .8 0 -.334 0 1 0 0 0 -.8 1-4ring4.dat
  [1,71,7.35,-.25,-3.26,.8,0,-.334,0,1,0,0,0,-.8, ldraw_lib__1_4ring4()],
// 1 4 7.35 -.25 -3.26 4 0 -1.67 0 1 0 0 0 -4 1-4ndis.dat
  [1,4,7.35,-.25,-3.26,4,0,-1.67,0,1,0,0,0,-4, ldraw_lib__1_4ndis()],
// 1 0 -3.33 -.25 -3.26 -3.2 0 -1.336 0 1 0 0 0 -3.2 1-4chrd.dat
  [1,0,-3.33,-.25,-3.26,-3.2,0,-1.336,0,1,0,0,0,-3.2, ldraw_lib__1_4chrd()],
// 1 71 -3.33 -.25 -3.26 -3.2 0 -1.336 0 1 0 0 0 -3.2 1-4tang.dat
  [1,71,-3.33,-.25,-3.26,-3.2,0,-1.336,0,1,0,0,0,-3.2, ldraw_lib__1_4tang()],
// 1 71 -3.33 -.25 -3.26 -1.67 0 -4 0 1 0 -4 0 0 1-8chrd.dat
  [1,71,-3.33,-.25,-3.26,-1.67,0,-4,0,1,0,-4,0,0, ldraw_lib__1_8chrd()],
// 1 4 -3.33 -.25 -3.26 -1.67 0 -4 0 1 0 -4 0 0 1-8tndis.dat
  [1,4,-3.33,-.25,-3.26,-1.67,0,-4,0,1,0,-4,0,0, ldraw_lib__1_8tndis()],
// 1 71 -13.7281 -.25 -6.46 -.8 0 -.334 0 1 0 0 0 -.8 1-4disc.dat
  [1,71,-13.7281,-.25,-6.46,-.8,0,-.334,0,1,0,0,0,-.8, ldraw_lib__1_4disc()],
// 1 4 -13.7281 -.25 -6.46 -.334 0 -.8 0 1 0 -.8 0 0 1-4ndis.dat
  [1,4,-13.7281,-.25,-6.46,-.334,0,-.8,0,1,0,-.8,0,0, ldraw_lib__1_4ndis()],
// 1 71 -8.666 -.25 -6.46 .8 0 -.334 0 1 0 0 0 -.8 1-4disc.dat
  [1,71,-8.666,-.25,-6.46,.8,0,-.334,0,1,0,0,0,-.8, ldraw_lib__1_4disc()],
// 1 4 -8.666 -.25 -6.46 .8 0 -.334 0 1 0 0 0 -.8 1-4ndis.dat
  [1,4,-8.666,-.25,-6.46,.8,0,-.334,0,1,0,0,0,-.8, ldraw_lib__1_4ndis()],
// 0 // Top face
// 0 // Black faces
// 4 0 -6.4719 -.25 6.46 -10.934 -.25 6.46 -12.2867 -.25 3.22 -10.4867 -.25 3.22
  [4,0,-6.4719,-.25,6.46,-10.934,-.25,6.46,-12.2867,-.25,3.22,-10.4867,-.25,3.22],
// 3 0 -6.4719 -.25 6.46 -10.4867 -.25 3.22 -9.6867 -.25 3.22
  [3,0,-6.4719,-.25,6.46,-10.4867,-.25,3.22,-9.6867,-.25,3.22],
// 3 0 -6.4719 -.25 6.46 -9.6867 -.25 3.22 -4.6079 -.25 3.26
  [3,0,-6.4719,-.25,6.46,-9.6867,-.25,3.22,-4.6079,-.25,3.26],
// 4 0 .7281 -.25 6.46 -3.8079 -.25 3.26 .6674 -.25 1.62 1.3354 -.25 3.22
  [4,0,.7281,-.25,6.46,-3.8079,-.25,3.26,.6674,-.25,1.62,1.3354,-.25,3.22],
// 3 0 .7281 -.25 6.46 1.3354 -.25 3.22 2.9354 -.25 3.22
  [3,0,.7281,-.25,6.46,1.3354,-.25,3.22,2.9354,-.25,3.22],
// 4 0 .7281 -.25 6.46 2.9354 -.25 3.22 8.0954 -.25 3.22 11.4081 -.25 6.46
  [4,0,.7281,-.25,6.46,2.9354,-.25,3.22,8.0954,-.25,3.22,11.4081,-.25,6.46],
// 3 0 11.4081 -.25 6.46 8.0954 -.25 3.22 8.8954 -.25 3.22
  [3,0,11.4081,-.25,6.46,8.0954,-.25,3.22,8.8954,-.25,3.22],
// 4 0 11.4081 -.25 6.46 8.8954 -.25 3.22 8.5614 -.25 2.42 13.2721 -.25 3.26
  [4,0,11.4081,-.25,6.46,8.8954,-.25,3.22,8.5614,-.25,2.42,13.2721,-.25,3.26],
// 3 0 -4.6079 -.25 3.26 -9.6867 -.25 3.22 -10.0207 -.25 2.42
  [3,0,-4.6079,-.25,3.26,-9.6867,-.25,3.22,-10.0207,-.25,2.42],
// 4 0 -4.6079 -.25 3.26 -10.0207 -.25 2.42 -13.7281 -.25 -6.46 -8.666 -.25 -6.46
  [4,0,-4.6079,-.25,3.26,-10.0207,-.25,2.42,-13.7281,-.25,-6.46,-8.666,-.25,-6.46],
// 4 0 -3.8079 -.25 3.26 -6.53 -.25 -3.26 -1.0193 -.25 -2.42 .6674 -.25 1.62
  [4,0,-3.8079,-.25,3.26,-6.53,-.25,-3.26,-1.0193,-.25,-2.42,.6674,-.25,1.62],
// 4 0 13.2721 -.25 3.26 8.5614 -.25 2.42 6.8747 -.25 -1.62 10.55 -.25 -3.26
  [4,0,13.2721,-.25,3.26,8.5614,-.25,2.42,6.8747,-.25,-1.62,10.55,-.25,-3.26],
// 4 0 -4.666 -.25 -6.46 -1.3533 -.25 -3.22 -1.0193 -.25 -2.42 -6.53 -.25 -3.26
  [4,0,-4.666,-.25,-6.46,-1.3533,-.25,-3.22,-1.0193,-.25,-2.42,-6.53,-.25,-3.26],
// 3 0 -4.666 -.25 -6.46 -.5533 -.25 -3.22 -1.3533 -.25 -3.22
  [3,0,-4.666,-.25,-6.46,-.5533,-.25,-3.22,-1.3533,-.25,-3.22],
// 4 0 -4.666 -.25 -6.46 6.014 -.25 -6.46 4.6067 -.25 -3.22 -.5533 -.25 -3.22
  [4,0,-4.666,-.25,-6.46,6.014,-.25,-6.46,4.6067,-.25,-3.22,-.5533,-.25,-3.22],
// 4 0 6.014 -.25 -6.46 10.55 -.25 -3.26 6.8747 -.25 -1.62 6.2067 -.25 -3.22
  [4,0,6.014,-.25,-6.46,10.55,-.25,-3.26,6.8747,-.25,-1.62,6.2067,-.25,-3.22],
// 3 0 6.014 -.25 -6.46 6.2067 -.25 -3.22 4.6067 -.25 -3.22
  [3,0,6.014,-.25,-6.46,6.2067,-.25,-3.22,4.6067,-.25,-3.22],
// 0 // Grey faces
// 4 71 -6.1379 -.25 7.26 -10.6 -.25 7.26 -10.934 -.25 6.46 -6.4719 -.25 6.46
  [4,71,-6.1379,-.25,7.26,-10.6,-.25,7.26,-10.934,-.25,6.46,-6.4719,-.25,6.46],
// 3 71 -6.1379 -.25 7.26 -6.4719 -.25 6.46 -5.83542 -.25 6.46
  [3,71,-6.1379,-.25,7.26,-6.4719,-.25,6.46,-5.83542,-.25,6.46],
// 3 71 -6.1379 -.25 7.26 -5.83542 -.25 6.46 -5.3489296 -.25 6.21648
  [3,71,-6.1379,-.25,7.26,-5.83542,-.25,6.46,-5.3489296,-.25,6.21648],
// 4 71 -6.1379 -.25 7.26 -5.3489296 -.25 6.21648 -4.8624392 -.25 5.97296 -3.798643 -.25 6.0884
  [4,71,-6.1379,-.25,7.26,-5.3489296,-.25,6.21648,-4.8624392,-.25,5.97296,-3.798643,-.25,6.0884],
// 4 71 1.0621 -.25 7.26 -2.255443 -.25 6.0884 -1.2880392 -.25 5.97296 -.5982096 -.25 6.21648
  [4,71,1.0621,-.25,7.26,-2.255443,-.25,6.0884,-1.2880392,-.25,5.97296,-.5982096,-.25,6.21648],
// 3 71 1.0621 -.25 7.26 -.5982096 -.25 6.21648 .09162 -.25 6.46
  [3,71,1.0621,-.25,7.26,-.5982096,-.25,6.21648,.09162,-.25,6.46],
// 3 71 1.0621 -.25 7.26 .09162 -.25 6.46 .7281 -.25 6.46
  [3,71,1.0621,-.25,7.26,.09162,-.25,6.46,.7281,-.25,6.46],
// 4 71 1.0621 -.25 7.26 .7281 -.25 6.46 11.4081 -.25 6.46 11.7421 -.25 7.26
  [4,71,1.0621,-.25,7.26,.7281,-.25,6.46,11.4081,-.25,6.46,11.7421,-.25,7.26],
// 4 71 -3.617604 -.25 5.6952 -3.798643 -.25 6.0884 -4.8624392 -.25 5.97296 -4.6004944 -.25 5.52272
  [4,71,-3.617604,-.25,5.6952,-3.798643,-.25,6.0884,-4.8624392,-.25,5.97296,-4.6004944,-.25,5.52272],
// 4 71 -3.617604 -.25 5.6952 -4.6004944 -.25 5.52272 -4.338096 -.25 5.0728 -3.5089 -.25 5.26
  [4,71,-3.617604,-.25,5.6952,-4.6004944,-.25,5.52272,-4.338096,-.25,5.0728,-3.5089,-.25,5.26],
// 4 71 -2.764804 -.25 5.6952 -1.9259344 -.25 5.52272 -1.2880392 -.25 5.97296 -2.255443 -.25 6.0884
  [4,71,-2.764804,-.25,5.6952,-1.9259344,-.25,5.52272,-1.2880392,-.25,5.97296,-2.255443,-.25,6.0884],
// 4 71 -2.764804 -.25 5.6952 -3.2369 -.25 5.26 -2.564016 -.25 5.0728 -1.9259344 -.25 5.52272
  [4,71,-2.764804,-.25,5.6952,-3.2369,-.25,5.26,-2.564016,-.25,5.0728,-1.9259344,-.25,5.52272],
// 4 71 -3.4879 -.25 4.9845 -3.5089 -.25 5.26 -4.338096 -.25 5.0728 -4.3401328 -.25 4.48464
  [4,71,-3.4879,-.25,4.9845,-3.5089,-.25,5.26,-4.338096,-.25,5.0728,-4.3401328,-.25,4.48464],
// 3 71 -3.4879 -.25 4.9845 -4.3401328 -.25 4.48464 -3.0530928 -.25 4.48464
  [3,71,-3.4879,-.25,4.9845,-4.3401328,-.25,4.48464,-3.0530928,-.25,4.48464],
// 4 71 -3.4879 -.25 4.9845 -3.0530928 -.25 4.48464 -2.564016 -.25 5.0728 -3.2369 -.25 5.26
  [4,71,-3.4879,-.25,4.9845,-3.0530928,-.25,4.48464,-2.564016,-.25,5.0728,-3.2369,-.25,5.26],
// 4 71 -4.3421696 -.25 3.89648 -3.5421696 -.25 3.89648 -3.0530928 -.25 4.48464 -4.3401328 -.25 4.48464
  [4,71,-4.3421696,-.25,3.89648,-3.5421696,-.25,3.89648,-3.0530928,-.25,4.48464,-4.3401328,-.25,4.48464],
// 4 71 -4.3421696 -.25 3.89648 -4.6079 -.25 3.26 -3.8079 -.25 3.26 -3.5421696 -.25 3.89648
  [4,71,-4.3421696,-.25,3.89648,-4.6079,-.25,3.26,-3.8079,-.25,3.26,-3.5421696,-.25,3.89648],
// 3 71 -4.6079 -.25 3.26 -6.53 -.25 -3.26 -3.8079 -.25 3.26
  [3,71,-4.6079,-.25,3.26,-6.53,-.25,-3.26,-3.8079,-.25,3.26],
// 3 71 -4.6079 -.25 3.26 -6.7957304 -.25 -3.89648 -6.53 -.25 -3.26
  [3,71,-4.6079,-.25,3.26,-6.7957304,-.25,-3.89648,-6.53,-.25,-3.26],
// 3 71 -4.6079 -.25 3.26 -7.5302 -.25 -5.6556 -6.7957304 -.25 -3.89648
  [3,71,-4.6079,-.25,3.26,-7.5302,-.25,-5.6556,-6.7957304,-.25,-3.89648],
// 4 71 -4.6079 -.25 3.26 -8.666 -.25 -6.46 -7.866 -.25 -6.46 -7.5302 -.25 -5.6556
  [4,71,-4.6079,-.25,3.26,-8.666,-.25,-6.46,-7.866,-.25,-6.46,-7.5302,-.25,-5.6556],
// 4 71 13.2721 -.25 3.26 10.55 -.25 -3.26 11.35 -.25 -3.26 14.0721 -.25 3.26
  [4,71,13.2721,-.25,3.26,10.55,-.25,-3.26,11.35,-.25,-3.26,14.0721,-.25,3.26],
// 4 71 -12.2867 -.25 3.22 -10.934 -.25 6.46 -11.734 -.25 6.46 -13.0867 -.25 3.22
  [4,71,-12.2867,-.25,3.22,-10.934,-.25,6.46,-11.734,-.25,6.46,-13.0867,-.25,3.22],
// 4 71 -12.2867 -.25 3.22 -12.6207 -.25 2.42 -10.8207 -.25 2.42 -10.4867 -.25 3.22
  [4,71,-12.2867,-.25,3.22,-12.6207,-.25,2.42,-10.8207,-.25,2.42,-10.4867,-.25,3.22],
// 4 71 7.7614 -.25 2.42 8.0954 -.25 3.22 2.9354 -.25 3.22 2.6014 -.25 2.42
  [4,71,7.7614,-.25,2.42,8.0954,-.25,3.22,2.9354,-.25,3.22,2.6014,-.25,2.42],
// 4 71 7.7614 -.25 2.42 6.0747 -.25 -1.62 6.8747 -.25 -1.62 8.5614 -.25 2.42
  [4,71,7.7614,-.25,2.42,6.0747,-.25,-1.62,6.8747,-.25,-1.62,8.5614,-.25,2.42],
// 4 71 -.2193 -.25 -2.42 1.4674 -.25 1.62 .6674 -.25 1.62 -1.0193 -.25 -2.42
  [4,71,-.2193,-.25,-2.42,1.4674,-.25,1.62,.6674,-.25,1.62,-1.0193,-.25,-2.42],
// 4 71 -.2193 -.25 -2.42 -.5533 -.25 -3.22 4.6067 -.25 -3.22 4.9407 -.25 -2.42
  [4,71,-.2193,-.25,-2.42,-.5533,-.25,-3.22,4.6067,-.25,-3.22,4.9407,-.25,-2.42],
// 3 71 -7.5302 -.25 -5.6556 -6.7977672 -.25 -4.48464 -6.7957304 -.25 -3.89648
  [3,71,-7.5302,-.25,-5.6556,-6.7977672,-.25,-4.48464,-6.7957304,-.25,-3.89648],
// 3 71 -7.5302 -.25 -5.6556 -6.799804 -.25 -5.0728 -6.7977672 -.25 -4.48464
  [3,71,-7.5302,-.25,-5.6556,-6.799804,-.25,-5.0728,-6.7977672,-.25,-4.48464],
// 3 71 -7.5302 -.25 -5.6556 -6.5374056 -.25 -5.52272 -6.799804 -.25 -5.0728
  [3,71,-7.5302,-.25,-5.6556,-6.5374056,-.25,-5.52272,-6.799804,-.25,-5.0728],
// 4 71 -7.5302 -.25 -5.6556 -7.339257 -.25 -6.0884 -6.2754608 -.25 -5.97296 -6.5374056 -.25 -5.52272
  [4,71,-7.5302,-.25,-5.6556,-7.339257,-.25,-6.0884,-6.2754608,-.25,-5.97296,-6.5374056,-.25,-5.52272],
// 4 71 -13.7281 -.25 -6.46 -10.0207 -.25 2.42 -10.8207 -.25 2.42 -14.5281 -.25 -6.46
  [4,71,-13.7281,-.25,-6.46,-10.0207,-.25,2.42,-10.8207,-.25,2.42,-14.5281,-.25,-6.46],
// 4 71 -13.7281 -.25 -6.46 -14.0621 -.25 -7.26 -9 -.25 -7.26 -8.666 -.25 -6.46
  [4,71,-13.7281,-.25,-6.46,-14.0621,-.25,-7.26,-9,-.25,-7.26,-8.666,-.25,-6.46],
// 4 71 -5 -.25 -7.26 -5.7889704 -.25 -6.21648 -6.2754608 -.25 -5.97296 -7.339257 -.25 -6.0884
  [4,71,-5,-.25,-7.26,-5.7889704,-.25,-6.21648,-6.2754608,-.25,-5.97296,-7.339257,-.25,-6.0884],
// 3 71 -5 -.25 -7.26 -5.30248 -.25 -6.46 -5.7889704 -.25 -6.21648
  [3,71,-5,-.25,-7.26,-5.30248,-.25,-6.46,-5.7889704,-.25,-6.21648],
// 3 71 -5 -.25 -7.26 -4.666 -.25 -6.46 -5.30248 -.25 -6.46
  [3,71,-5,-.25,-7.26,-4.666,-.25,-6.46,-5.30248,-.25,-6.46],
// 4 71 -5 -.25 -7.26 5.68 -.25 -7.26 6.014 -.25 -6.46 -4.666 -.25 -6.46
  [4,71,-5,-.25,-7.26,5.68,-.25,-7.26,6.014,-.25,-6.46,-4.666,-.25,-6.46],
// 0 // Red faces
// 4 4 -13.5 -.25 10 -15 -.25 8.5 -13.4207 -.25 2.42 -13.0867 -.25 3.22
  [4,4,-13.5,-.25,10,-15,-.25,8.5,-13.4207,-.25,2.42,-13.0867,-.25,3.22],
// 3 4 -13.5 -.25 10 -13.0867 -.25 3.22 -11.734 -.25 6.46
  [3,4,-13.5,-.25,10,-13.0867,-.25,3.22,-11.734,-.25,6.46],
// 3 4 -13.5 -.25 10 -11.734 -.25 6.46 -11.4 -.25 7.26
  [3,4,-13.5,-.25,10,-11.734,-.25,6.46,-11.4,-.25,7.26],
// 3 4 -13.5 -.25 10 -11.4 -.25 7.26 -10.6 -.25 7.26
  [3,4,-13.5,-.25,10,-11.4,-.25,7.26,-10.6,-.25,7.26],
// 3 4 -13.5 -.25 10 -10.6 -.25 7.26 -6.1379 -.25 7.26
  [3,4,-13.5,-.25,10,-10.6,-.25,7.26,-6.1379,-.25,7.26],
// 3 4 -13.5 -.25 10 -6.1379 -.25 7.26 -3.3095 -.25 7.26
  [3,4,-13.5,-.25,10,-6.1379,-.25,7.26,-3.3095,-.25,7.26],
// 4 4 -13.5 -.25 10 -3.3095 -.25 7.26 -1.7663 -.25 7.26 13.5 -.25 10
  [4,4,-13.5,-.25,10,-3.3095,-.25,7.26,-1.7663,-.25,7.26,13.5,-.25,10],
// 3 4 13.5 -.25 10 -1.7663 -.25 7.26 1.0621 -.25 7.26
  [3,4,13.5,-.25,10,-1.7663,-.25,7.26,1.0621,-.25,7.26],
// 3 4 13.5 -.25 10 1.0621 -.25 7.26 11.7421 -.25 7.26
  [3,4,13.5,-.25,10,1.0621,-.25,7.26,11.7421,-.25,7.26],
// 4 4 13.5 -.25 10 11.7421 -.25 7.26 14.5705 -.25 7.26 15 -.25 8.5
  [4,4,13.5,-.25,10,11.7421,-.25,7.26,14.5705,-.25,7.26,15,-.25,8.5],
// 4 4 -1.7663 -.25 7.26 -3.3095 -.25 7.26 -3.798643 -.25 6.0884 -3.617604 -.25 5.6952
  [4,4,-1.7663,-.25,7.26,-3.3095,-.25,7.26,-3.798643,-.25,6.0884,-3.617604,-.25,5.6952],
// 3 4 -1.7663 -.25 7.26 -3.617604 -.25 5.6952 -3.5089 -.25 5.26
  [3,4,-1.7663,-.25,7.26,-3.617604,-.25,5.6952,-3.5089,-.25,5.26],
// 4 4 -1.7663 -.25 7.26 -3.5089 -.25 5.26 -3.4879 -.25 4.9845 -3.2369 -.25 5.26
  [4,4,-1.7663,-.25,7.26,-3.5089,-.25,5.26,-3.4879,-.25,4.9845,-3.2369,-.25,5.26],
// 3 4 -1.7663 -.25 7.26 -3.2369 -.25 5.26 -2.764804 -.25 5.6952
  [3,4,-1.7663,-.25,7.26,-3.2369,-.25,5.26,-2.764804,-.25,5.6952],
// 3 4 -1.7663 -.25 7.26 -2.764804 -.25 5.6952 -2.255443 -.25 6.0884
  [3,4,-1.7663,-.25,7.26,-2.764804,-.25,5.6952,-2.255443,-.25,6.0884],
// 3 4 14.5705 -.25 7.26 14.081357 -.25 6.0884 14.409355 -.25 5.526
  [3,4,14.5705,-.25,7.26,14.081357,-.25,6.0884,14.409355,-.25,5.526],
// 4 4 14.5705 -.25 7.26 14.409355 -.25 5.526 14.406809 -.25 4.7908 15 -.25 8.5
  [4,4,14.5705,-.25,7.26,14.409355,-.25,5.526,14.406809,-.25,4.7908,15,-.25,8.5],
// 4 4 7.7614 -.25 2.42 2.6014 -.25 2.42 1.4674 -.25 1.62 -.2193 -.25 -2.42
  [4,4,7.7614,-.25,2.42,2.6014,-.25,2.42,1.4674,-.25,1.62,-.2193,-.25,-2.42],
// 4 4 7.7614 -.25 2.42 -.2193 -.25 -2.42 4.9407 -.25 -2.42 6.0747 -.25 -1.62
  [4,4,7.7614,-.25,2.42,-.2193,-.25,-2.42,4.9407,-.25,-2.42,6.0747,-.25,-1.62],
// 4 4 -14.5281 -.25 -6.46 -13.4207 -.25 2.42 -15 -.25 8.5 -14.8621 -.25 -7.26
  [4,4,-14.5281,-.25,-6.46,-13.4207,-.25,2.42,-15,-.25,8.5,-14.8621,-.25,-7.26],
// 3 4 -14.5281 -.25 -6.46 -12.6207 -.25 2.42 -13.4207 -.25 2.42
  [3,4,-14.5281,-.25,-6.46,-12.6207,-.25,2.42,-13.4207,-.25,2.42],
// 3 4 -14.5281 -.25 -6.46 -10.8207 -.25 2.42 -12.6207 -.25 2.42
  [3,4,-14.5281,-.25,-6.46,-10.8207,-.25,2.42,-12.6207,-.25,2.42],
// 4 4 -7.866 -.25 -6.46 -7.8284 -.25 -7.26 -7.339257 -.25 -6.0884 -7.5302 -.25 -5.6556
  [4,4,-7.866,-.25,-6.46,-7.8284,-.25,-7.26,-7.339257,-.25,-6.0884,-7.5302,-.25,-5.6556],
// 3 4 -7.866 -.25 -6.46 -8.2 -.25 -7.26 -7.8284 -.25 -7.26
  [3,4,-7.866,-.25,-6.46,-8.2,-.25,-7.26,-7.8284,-.25,-7.26],
// 3 4 -15 -.25 -8.5 -14.8621 -.25 -7.26 -15 -.25 8.5
  [3,4,-15,-.25,-8.5,-14.8621,-.25,-7.26,-15,-.25,8.5],
// 4 4 15 -.25 8.5 14.406809 -.25 4.7908 14.404263 -.25 4.0556 15 -.25 -8.5
  [4,4,15,-.25,8.5,14.406809,-.25,4.7908,14.404263,-.25,4.0556,15,-.25,-8.5],
// 3 4 15 -.25 -8.5 14.404263 -.25 4.0556 14.0721 -.25 3.26
  [3,4,15,-.25,-8.5,14.404263,-.25,4.0556,14.0721,-.25,3.26],
// 3 4 15 -.25 -8.5 14.0721 -.25 3.26 11.35 -.25 -3.26
  [3,4,15,-.25,-8.5,14.0721,-.25,3.26,11.35,-.25,-3.26],
// 4 4 15 -.25 -8.5 11.35 -.25 -3.26 9.68 -.25 -7.26 13.5 -.25 -10
  [4,4,15,-.25,-8.5,11.35,-.25,-3.26,9.68,-.25,-7.26,13.5,-.25,-10],
// 4 4 -13.5 -.25 -10 -14.0621 -.25 -7.26 -14.8621 -.25 -7.26 -15 -.25 -8.5
  [4,4,-13.5,-.25,-10,-14.0621,-.25,-7.26,-14.8621,-.25,-7.26,-15,-.25,-8.5],
// 3 4 -13.5 -.25 -10 -9 -.25 -7.26 -14.0621 -.25 -7.26
  [3,4,-13.5,-.25,-10,-9,-.25,-7.26,-14.0621,-.25,-7.26],
// 3 4 -13.5 -.25 -10 -8.2 -.25 -7.26 -9 -.25 -7.26
  [3,4,-13.5,-.25,-10,-8.2,-.25,-7.26,-9,-.25,-7.26],
// 3 4 -13.5 -.25 -10 -7.8284 -.25 -7.26 -8.2 -.25 -7.26
  [3,4,-13.5,-.25,-10,-7.8284,-.25,-7.26,-8.2,-.25,-7.26],
// 4 4 -13.5 -.25 -10 13.5 -.25 -10 -5 -.25 -7.26 -7.8284 -.25 -7.26
  [4,4,-13.5,-.25,-10,13.5,-.25,-10,-5,-.25,-7.26,-7.8284,-.25,-7.26],
// 3 4 13.5 -.25 -10 9.68 -.25 -7.26 5.68 -.25 -7.26
  [3,4,13.5,-.25,-10,9.68,-.25,-7.26,5.68,-.25,-7.26],
// 3 4 13.5 -.25 -10 5.68 -.25 -7.26 -5 -.25 -7.26
  [3,4,13.5,-.25,-10,5.68,-.25,-7.26,-5,-.25,-7.26],
];
module ldraw_lib__6177970t(step=0, col=false, unit=2/5, alt=false, line=0.2, solid=!$preview)
    makepoly(ldraw_lib__6177970t(), step=step, col=col, unit=unit, alt=alt, line=line, solid=solid);
ldraw_lib__6177970t(line=0.2);
